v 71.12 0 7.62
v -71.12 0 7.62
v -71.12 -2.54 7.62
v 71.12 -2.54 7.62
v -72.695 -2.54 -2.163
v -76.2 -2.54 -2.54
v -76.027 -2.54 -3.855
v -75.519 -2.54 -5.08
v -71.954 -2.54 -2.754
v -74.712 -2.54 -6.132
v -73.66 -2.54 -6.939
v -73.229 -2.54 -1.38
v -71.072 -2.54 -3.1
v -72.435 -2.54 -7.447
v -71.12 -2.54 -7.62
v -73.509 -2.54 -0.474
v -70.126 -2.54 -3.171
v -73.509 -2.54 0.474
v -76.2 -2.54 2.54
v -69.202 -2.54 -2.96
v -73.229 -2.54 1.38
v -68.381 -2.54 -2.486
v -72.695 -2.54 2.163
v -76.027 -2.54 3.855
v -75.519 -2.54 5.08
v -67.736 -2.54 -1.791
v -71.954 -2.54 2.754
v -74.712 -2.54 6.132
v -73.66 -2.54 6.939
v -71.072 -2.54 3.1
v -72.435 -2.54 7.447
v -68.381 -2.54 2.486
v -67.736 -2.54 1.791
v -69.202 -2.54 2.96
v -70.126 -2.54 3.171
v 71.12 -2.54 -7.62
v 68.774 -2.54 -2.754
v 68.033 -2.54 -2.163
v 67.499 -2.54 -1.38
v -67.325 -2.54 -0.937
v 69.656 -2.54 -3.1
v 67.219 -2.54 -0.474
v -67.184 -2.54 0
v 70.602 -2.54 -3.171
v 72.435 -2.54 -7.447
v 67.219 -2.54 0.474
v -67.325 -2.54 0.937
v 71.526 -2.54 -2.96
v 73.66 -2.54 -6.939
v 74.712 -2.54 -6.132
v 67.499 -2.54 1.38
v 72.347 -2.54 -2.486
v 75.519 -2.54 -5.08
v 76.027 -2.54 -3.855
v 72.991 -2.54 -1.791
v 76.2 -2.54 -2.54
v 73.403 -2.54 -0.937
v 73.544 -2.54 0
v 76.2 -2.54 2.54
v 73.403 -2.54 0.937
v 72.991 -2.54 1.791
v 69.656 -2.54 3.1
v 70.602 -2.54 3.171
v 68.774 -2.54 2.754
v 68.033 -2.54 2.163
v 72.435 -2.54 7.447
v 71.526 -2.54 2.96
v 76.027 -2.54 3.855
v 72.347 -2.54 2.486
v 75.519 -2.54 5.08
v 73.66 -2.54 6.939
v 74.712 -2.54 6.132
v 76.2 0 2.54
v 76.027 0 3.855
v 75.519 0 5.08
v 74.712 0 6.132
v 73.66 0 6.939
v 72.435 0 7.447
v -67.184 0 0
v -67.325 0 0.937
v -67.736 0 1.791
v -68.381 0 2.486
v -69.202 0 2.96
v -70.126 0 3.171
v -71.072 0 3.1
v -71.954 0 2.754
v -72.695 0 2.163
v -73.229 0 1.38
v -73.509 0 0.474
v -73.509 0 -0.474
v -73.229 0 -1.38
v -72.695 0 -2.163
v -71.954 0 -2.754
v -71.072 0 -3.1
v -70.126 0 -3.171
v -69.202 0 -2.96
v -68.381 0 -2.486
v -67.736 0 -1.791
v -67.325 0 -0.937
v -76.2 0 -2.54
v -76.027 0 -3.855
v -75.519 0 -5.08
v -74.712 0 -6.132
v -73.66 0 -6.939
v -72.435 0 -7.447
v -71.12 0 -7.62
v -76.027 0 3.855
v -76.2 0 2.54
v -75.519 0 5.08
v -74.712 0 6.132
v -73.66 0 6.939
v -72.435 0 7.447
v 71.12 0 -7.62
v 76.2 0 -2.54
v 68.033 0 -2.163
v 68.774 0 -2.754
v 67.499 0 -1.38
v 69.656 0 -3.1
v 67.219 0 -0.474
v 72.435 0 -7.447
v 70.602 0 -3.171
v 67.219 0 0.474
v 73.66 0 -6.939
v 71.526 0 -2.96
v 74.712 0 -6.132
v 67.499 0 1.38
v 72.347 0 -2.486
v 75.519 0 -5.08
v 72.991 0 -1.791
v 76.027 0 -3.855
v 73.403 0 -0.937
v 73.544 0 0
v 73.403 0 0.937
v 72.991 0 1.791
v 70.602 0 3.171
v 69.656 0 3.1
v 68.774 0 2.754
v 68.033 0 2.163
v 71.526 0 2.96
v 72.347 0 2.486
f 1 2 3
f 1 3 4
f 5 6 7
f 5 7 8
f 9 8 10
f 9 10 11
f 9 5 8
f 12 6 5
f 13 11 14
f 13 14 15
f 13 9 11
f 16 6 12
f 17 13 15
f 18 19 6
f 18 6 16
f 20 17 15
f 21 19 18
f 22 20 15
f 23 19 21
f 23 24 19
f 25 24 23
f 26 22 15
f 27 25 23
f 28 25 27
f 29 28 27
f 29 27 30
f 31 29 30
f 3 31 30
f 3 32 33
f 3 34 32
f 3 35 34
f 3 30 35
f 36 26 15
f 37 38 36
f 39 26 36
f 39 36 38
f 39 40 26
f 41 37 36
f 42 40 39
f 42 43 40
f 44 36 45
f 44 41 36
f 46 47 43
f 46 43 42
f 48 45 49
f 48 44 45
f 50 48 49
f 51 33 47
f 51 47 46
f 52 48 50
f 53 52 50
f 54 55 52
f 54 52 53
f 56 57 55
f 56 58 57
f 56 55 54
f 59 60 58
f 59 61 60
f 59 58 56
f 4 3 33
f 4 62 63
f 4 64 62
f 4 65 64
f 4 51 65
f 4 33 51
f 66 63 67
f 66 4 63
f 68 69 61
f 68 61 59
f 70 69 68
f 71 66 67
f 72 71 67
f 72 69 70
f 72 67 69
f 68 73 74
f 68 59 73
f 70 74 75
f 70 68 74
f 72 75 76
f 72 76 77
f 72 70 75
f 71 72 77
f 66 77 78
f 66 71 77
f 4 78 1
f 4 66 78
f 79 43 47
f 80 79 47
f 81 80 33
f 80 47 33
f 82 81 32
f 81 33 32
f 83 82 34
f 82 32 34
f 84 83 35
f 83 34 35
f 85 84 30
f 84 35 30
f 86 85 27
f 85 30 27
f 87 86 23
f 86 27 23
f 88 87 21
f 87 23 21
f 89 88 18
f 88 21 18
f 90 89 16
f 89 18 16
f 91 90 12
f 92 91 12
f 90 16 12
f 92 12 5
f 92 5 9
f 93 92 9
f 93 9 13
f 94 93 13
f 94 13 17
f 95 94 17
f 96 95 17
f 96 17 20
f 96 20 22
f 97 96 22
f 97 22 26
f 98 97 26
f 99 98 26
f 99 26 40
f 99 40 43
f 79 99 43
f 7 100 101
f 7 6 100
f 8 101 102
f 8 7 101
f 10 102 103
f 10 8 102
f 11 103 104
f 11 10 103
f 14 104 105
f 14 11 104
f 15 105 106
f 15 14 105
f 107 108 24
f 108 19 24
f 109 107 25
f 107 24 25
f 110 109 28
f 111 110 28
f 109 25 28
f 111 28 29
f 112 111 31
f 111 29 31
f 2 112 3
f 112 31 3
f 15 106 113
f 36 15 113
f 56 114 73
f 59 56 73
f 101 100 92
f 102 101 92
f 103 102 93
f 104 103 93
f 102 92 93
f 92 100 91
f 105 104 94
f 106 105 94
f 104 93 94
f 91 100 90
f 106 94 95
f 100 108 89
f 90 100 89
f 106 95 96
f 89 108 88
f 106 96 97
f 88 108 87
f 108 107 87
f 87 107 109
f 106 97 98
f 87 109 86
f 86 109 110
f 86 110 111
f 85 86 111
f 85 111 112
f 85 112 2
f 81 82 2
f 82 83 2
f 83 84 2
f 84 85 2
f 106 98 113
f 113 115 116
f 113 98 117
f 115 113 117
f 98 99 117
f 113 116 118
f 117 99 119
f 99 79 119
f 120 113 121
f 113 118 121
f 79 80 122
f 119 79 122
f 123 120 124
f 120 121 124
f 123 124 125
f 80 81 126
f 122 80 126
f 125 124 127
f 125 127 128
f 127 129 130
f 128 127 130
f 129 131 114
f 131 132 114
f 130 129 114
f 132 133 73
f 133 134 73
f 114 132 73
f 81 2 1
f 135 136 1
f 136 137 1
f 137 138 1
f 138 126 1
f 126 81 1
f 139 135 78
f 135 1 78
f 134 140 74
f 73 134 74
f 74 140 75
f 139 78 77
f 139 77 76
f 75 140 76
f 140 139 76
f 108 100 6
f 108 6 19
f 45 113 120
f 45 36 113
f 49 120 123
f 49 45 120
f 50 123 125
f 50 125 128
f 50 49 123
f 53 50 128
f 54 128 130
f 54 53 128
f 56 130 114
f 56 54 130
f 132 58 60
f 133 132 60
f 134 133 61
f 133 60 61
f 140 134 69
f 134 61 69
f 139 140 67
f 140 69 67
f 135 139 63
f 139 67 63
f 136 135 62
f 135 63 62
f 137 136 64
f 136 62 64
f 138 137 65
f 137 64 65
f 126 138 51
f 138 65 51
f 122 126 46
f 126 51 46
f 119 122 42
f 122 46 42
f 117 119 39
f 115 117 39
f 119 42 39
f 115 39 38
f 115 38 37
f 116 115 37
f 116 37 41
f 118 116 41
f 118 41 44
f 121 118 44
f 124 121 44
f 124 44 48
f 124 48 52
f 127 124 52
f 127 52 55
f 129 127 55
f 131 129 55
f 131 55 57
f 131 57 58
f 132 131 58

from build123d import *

# Parameters (mm, degrees)
F0_W     = 152.4
F0_H     = 15.24
F1_DEPTH = 2.54
F2_R     = 5.08
F3_R     = 3.180059
F4_DEPTH = 25.4


with BuildPart() as f1:
    # F0 (on Front) → F1 (new body)
    with BuildSketch(Plane.XZ):
        Rectangle(F0_W, F0_H)
    extrude(amount=F1_DEPTH)

    # F2
    f2_edges = [f1.edges().sort_by_distance(p)[0] for p in [
        (-76.2, -1.27, 7.62),
        (-76.2, -1.27, -7.62),
        (76.2, -1.27, 7.62),
        (76.2, -1.27, -7.62),
    ]]
    fillet(f2_edges, radius=F2_R)

    # F3 (on face) → F4 (cut)
    with BuildSketch(Plane.XZ.offset(2.54)):
        with Locations((-70.363984, 0)):
            Circle(F3_R)
        with Locations((70.363984, 0)):
            Circle(F3_R)
    extrude(amount=-F4_DEPTH, mode=Mode.SUBTRACT)


solid = f1.part
